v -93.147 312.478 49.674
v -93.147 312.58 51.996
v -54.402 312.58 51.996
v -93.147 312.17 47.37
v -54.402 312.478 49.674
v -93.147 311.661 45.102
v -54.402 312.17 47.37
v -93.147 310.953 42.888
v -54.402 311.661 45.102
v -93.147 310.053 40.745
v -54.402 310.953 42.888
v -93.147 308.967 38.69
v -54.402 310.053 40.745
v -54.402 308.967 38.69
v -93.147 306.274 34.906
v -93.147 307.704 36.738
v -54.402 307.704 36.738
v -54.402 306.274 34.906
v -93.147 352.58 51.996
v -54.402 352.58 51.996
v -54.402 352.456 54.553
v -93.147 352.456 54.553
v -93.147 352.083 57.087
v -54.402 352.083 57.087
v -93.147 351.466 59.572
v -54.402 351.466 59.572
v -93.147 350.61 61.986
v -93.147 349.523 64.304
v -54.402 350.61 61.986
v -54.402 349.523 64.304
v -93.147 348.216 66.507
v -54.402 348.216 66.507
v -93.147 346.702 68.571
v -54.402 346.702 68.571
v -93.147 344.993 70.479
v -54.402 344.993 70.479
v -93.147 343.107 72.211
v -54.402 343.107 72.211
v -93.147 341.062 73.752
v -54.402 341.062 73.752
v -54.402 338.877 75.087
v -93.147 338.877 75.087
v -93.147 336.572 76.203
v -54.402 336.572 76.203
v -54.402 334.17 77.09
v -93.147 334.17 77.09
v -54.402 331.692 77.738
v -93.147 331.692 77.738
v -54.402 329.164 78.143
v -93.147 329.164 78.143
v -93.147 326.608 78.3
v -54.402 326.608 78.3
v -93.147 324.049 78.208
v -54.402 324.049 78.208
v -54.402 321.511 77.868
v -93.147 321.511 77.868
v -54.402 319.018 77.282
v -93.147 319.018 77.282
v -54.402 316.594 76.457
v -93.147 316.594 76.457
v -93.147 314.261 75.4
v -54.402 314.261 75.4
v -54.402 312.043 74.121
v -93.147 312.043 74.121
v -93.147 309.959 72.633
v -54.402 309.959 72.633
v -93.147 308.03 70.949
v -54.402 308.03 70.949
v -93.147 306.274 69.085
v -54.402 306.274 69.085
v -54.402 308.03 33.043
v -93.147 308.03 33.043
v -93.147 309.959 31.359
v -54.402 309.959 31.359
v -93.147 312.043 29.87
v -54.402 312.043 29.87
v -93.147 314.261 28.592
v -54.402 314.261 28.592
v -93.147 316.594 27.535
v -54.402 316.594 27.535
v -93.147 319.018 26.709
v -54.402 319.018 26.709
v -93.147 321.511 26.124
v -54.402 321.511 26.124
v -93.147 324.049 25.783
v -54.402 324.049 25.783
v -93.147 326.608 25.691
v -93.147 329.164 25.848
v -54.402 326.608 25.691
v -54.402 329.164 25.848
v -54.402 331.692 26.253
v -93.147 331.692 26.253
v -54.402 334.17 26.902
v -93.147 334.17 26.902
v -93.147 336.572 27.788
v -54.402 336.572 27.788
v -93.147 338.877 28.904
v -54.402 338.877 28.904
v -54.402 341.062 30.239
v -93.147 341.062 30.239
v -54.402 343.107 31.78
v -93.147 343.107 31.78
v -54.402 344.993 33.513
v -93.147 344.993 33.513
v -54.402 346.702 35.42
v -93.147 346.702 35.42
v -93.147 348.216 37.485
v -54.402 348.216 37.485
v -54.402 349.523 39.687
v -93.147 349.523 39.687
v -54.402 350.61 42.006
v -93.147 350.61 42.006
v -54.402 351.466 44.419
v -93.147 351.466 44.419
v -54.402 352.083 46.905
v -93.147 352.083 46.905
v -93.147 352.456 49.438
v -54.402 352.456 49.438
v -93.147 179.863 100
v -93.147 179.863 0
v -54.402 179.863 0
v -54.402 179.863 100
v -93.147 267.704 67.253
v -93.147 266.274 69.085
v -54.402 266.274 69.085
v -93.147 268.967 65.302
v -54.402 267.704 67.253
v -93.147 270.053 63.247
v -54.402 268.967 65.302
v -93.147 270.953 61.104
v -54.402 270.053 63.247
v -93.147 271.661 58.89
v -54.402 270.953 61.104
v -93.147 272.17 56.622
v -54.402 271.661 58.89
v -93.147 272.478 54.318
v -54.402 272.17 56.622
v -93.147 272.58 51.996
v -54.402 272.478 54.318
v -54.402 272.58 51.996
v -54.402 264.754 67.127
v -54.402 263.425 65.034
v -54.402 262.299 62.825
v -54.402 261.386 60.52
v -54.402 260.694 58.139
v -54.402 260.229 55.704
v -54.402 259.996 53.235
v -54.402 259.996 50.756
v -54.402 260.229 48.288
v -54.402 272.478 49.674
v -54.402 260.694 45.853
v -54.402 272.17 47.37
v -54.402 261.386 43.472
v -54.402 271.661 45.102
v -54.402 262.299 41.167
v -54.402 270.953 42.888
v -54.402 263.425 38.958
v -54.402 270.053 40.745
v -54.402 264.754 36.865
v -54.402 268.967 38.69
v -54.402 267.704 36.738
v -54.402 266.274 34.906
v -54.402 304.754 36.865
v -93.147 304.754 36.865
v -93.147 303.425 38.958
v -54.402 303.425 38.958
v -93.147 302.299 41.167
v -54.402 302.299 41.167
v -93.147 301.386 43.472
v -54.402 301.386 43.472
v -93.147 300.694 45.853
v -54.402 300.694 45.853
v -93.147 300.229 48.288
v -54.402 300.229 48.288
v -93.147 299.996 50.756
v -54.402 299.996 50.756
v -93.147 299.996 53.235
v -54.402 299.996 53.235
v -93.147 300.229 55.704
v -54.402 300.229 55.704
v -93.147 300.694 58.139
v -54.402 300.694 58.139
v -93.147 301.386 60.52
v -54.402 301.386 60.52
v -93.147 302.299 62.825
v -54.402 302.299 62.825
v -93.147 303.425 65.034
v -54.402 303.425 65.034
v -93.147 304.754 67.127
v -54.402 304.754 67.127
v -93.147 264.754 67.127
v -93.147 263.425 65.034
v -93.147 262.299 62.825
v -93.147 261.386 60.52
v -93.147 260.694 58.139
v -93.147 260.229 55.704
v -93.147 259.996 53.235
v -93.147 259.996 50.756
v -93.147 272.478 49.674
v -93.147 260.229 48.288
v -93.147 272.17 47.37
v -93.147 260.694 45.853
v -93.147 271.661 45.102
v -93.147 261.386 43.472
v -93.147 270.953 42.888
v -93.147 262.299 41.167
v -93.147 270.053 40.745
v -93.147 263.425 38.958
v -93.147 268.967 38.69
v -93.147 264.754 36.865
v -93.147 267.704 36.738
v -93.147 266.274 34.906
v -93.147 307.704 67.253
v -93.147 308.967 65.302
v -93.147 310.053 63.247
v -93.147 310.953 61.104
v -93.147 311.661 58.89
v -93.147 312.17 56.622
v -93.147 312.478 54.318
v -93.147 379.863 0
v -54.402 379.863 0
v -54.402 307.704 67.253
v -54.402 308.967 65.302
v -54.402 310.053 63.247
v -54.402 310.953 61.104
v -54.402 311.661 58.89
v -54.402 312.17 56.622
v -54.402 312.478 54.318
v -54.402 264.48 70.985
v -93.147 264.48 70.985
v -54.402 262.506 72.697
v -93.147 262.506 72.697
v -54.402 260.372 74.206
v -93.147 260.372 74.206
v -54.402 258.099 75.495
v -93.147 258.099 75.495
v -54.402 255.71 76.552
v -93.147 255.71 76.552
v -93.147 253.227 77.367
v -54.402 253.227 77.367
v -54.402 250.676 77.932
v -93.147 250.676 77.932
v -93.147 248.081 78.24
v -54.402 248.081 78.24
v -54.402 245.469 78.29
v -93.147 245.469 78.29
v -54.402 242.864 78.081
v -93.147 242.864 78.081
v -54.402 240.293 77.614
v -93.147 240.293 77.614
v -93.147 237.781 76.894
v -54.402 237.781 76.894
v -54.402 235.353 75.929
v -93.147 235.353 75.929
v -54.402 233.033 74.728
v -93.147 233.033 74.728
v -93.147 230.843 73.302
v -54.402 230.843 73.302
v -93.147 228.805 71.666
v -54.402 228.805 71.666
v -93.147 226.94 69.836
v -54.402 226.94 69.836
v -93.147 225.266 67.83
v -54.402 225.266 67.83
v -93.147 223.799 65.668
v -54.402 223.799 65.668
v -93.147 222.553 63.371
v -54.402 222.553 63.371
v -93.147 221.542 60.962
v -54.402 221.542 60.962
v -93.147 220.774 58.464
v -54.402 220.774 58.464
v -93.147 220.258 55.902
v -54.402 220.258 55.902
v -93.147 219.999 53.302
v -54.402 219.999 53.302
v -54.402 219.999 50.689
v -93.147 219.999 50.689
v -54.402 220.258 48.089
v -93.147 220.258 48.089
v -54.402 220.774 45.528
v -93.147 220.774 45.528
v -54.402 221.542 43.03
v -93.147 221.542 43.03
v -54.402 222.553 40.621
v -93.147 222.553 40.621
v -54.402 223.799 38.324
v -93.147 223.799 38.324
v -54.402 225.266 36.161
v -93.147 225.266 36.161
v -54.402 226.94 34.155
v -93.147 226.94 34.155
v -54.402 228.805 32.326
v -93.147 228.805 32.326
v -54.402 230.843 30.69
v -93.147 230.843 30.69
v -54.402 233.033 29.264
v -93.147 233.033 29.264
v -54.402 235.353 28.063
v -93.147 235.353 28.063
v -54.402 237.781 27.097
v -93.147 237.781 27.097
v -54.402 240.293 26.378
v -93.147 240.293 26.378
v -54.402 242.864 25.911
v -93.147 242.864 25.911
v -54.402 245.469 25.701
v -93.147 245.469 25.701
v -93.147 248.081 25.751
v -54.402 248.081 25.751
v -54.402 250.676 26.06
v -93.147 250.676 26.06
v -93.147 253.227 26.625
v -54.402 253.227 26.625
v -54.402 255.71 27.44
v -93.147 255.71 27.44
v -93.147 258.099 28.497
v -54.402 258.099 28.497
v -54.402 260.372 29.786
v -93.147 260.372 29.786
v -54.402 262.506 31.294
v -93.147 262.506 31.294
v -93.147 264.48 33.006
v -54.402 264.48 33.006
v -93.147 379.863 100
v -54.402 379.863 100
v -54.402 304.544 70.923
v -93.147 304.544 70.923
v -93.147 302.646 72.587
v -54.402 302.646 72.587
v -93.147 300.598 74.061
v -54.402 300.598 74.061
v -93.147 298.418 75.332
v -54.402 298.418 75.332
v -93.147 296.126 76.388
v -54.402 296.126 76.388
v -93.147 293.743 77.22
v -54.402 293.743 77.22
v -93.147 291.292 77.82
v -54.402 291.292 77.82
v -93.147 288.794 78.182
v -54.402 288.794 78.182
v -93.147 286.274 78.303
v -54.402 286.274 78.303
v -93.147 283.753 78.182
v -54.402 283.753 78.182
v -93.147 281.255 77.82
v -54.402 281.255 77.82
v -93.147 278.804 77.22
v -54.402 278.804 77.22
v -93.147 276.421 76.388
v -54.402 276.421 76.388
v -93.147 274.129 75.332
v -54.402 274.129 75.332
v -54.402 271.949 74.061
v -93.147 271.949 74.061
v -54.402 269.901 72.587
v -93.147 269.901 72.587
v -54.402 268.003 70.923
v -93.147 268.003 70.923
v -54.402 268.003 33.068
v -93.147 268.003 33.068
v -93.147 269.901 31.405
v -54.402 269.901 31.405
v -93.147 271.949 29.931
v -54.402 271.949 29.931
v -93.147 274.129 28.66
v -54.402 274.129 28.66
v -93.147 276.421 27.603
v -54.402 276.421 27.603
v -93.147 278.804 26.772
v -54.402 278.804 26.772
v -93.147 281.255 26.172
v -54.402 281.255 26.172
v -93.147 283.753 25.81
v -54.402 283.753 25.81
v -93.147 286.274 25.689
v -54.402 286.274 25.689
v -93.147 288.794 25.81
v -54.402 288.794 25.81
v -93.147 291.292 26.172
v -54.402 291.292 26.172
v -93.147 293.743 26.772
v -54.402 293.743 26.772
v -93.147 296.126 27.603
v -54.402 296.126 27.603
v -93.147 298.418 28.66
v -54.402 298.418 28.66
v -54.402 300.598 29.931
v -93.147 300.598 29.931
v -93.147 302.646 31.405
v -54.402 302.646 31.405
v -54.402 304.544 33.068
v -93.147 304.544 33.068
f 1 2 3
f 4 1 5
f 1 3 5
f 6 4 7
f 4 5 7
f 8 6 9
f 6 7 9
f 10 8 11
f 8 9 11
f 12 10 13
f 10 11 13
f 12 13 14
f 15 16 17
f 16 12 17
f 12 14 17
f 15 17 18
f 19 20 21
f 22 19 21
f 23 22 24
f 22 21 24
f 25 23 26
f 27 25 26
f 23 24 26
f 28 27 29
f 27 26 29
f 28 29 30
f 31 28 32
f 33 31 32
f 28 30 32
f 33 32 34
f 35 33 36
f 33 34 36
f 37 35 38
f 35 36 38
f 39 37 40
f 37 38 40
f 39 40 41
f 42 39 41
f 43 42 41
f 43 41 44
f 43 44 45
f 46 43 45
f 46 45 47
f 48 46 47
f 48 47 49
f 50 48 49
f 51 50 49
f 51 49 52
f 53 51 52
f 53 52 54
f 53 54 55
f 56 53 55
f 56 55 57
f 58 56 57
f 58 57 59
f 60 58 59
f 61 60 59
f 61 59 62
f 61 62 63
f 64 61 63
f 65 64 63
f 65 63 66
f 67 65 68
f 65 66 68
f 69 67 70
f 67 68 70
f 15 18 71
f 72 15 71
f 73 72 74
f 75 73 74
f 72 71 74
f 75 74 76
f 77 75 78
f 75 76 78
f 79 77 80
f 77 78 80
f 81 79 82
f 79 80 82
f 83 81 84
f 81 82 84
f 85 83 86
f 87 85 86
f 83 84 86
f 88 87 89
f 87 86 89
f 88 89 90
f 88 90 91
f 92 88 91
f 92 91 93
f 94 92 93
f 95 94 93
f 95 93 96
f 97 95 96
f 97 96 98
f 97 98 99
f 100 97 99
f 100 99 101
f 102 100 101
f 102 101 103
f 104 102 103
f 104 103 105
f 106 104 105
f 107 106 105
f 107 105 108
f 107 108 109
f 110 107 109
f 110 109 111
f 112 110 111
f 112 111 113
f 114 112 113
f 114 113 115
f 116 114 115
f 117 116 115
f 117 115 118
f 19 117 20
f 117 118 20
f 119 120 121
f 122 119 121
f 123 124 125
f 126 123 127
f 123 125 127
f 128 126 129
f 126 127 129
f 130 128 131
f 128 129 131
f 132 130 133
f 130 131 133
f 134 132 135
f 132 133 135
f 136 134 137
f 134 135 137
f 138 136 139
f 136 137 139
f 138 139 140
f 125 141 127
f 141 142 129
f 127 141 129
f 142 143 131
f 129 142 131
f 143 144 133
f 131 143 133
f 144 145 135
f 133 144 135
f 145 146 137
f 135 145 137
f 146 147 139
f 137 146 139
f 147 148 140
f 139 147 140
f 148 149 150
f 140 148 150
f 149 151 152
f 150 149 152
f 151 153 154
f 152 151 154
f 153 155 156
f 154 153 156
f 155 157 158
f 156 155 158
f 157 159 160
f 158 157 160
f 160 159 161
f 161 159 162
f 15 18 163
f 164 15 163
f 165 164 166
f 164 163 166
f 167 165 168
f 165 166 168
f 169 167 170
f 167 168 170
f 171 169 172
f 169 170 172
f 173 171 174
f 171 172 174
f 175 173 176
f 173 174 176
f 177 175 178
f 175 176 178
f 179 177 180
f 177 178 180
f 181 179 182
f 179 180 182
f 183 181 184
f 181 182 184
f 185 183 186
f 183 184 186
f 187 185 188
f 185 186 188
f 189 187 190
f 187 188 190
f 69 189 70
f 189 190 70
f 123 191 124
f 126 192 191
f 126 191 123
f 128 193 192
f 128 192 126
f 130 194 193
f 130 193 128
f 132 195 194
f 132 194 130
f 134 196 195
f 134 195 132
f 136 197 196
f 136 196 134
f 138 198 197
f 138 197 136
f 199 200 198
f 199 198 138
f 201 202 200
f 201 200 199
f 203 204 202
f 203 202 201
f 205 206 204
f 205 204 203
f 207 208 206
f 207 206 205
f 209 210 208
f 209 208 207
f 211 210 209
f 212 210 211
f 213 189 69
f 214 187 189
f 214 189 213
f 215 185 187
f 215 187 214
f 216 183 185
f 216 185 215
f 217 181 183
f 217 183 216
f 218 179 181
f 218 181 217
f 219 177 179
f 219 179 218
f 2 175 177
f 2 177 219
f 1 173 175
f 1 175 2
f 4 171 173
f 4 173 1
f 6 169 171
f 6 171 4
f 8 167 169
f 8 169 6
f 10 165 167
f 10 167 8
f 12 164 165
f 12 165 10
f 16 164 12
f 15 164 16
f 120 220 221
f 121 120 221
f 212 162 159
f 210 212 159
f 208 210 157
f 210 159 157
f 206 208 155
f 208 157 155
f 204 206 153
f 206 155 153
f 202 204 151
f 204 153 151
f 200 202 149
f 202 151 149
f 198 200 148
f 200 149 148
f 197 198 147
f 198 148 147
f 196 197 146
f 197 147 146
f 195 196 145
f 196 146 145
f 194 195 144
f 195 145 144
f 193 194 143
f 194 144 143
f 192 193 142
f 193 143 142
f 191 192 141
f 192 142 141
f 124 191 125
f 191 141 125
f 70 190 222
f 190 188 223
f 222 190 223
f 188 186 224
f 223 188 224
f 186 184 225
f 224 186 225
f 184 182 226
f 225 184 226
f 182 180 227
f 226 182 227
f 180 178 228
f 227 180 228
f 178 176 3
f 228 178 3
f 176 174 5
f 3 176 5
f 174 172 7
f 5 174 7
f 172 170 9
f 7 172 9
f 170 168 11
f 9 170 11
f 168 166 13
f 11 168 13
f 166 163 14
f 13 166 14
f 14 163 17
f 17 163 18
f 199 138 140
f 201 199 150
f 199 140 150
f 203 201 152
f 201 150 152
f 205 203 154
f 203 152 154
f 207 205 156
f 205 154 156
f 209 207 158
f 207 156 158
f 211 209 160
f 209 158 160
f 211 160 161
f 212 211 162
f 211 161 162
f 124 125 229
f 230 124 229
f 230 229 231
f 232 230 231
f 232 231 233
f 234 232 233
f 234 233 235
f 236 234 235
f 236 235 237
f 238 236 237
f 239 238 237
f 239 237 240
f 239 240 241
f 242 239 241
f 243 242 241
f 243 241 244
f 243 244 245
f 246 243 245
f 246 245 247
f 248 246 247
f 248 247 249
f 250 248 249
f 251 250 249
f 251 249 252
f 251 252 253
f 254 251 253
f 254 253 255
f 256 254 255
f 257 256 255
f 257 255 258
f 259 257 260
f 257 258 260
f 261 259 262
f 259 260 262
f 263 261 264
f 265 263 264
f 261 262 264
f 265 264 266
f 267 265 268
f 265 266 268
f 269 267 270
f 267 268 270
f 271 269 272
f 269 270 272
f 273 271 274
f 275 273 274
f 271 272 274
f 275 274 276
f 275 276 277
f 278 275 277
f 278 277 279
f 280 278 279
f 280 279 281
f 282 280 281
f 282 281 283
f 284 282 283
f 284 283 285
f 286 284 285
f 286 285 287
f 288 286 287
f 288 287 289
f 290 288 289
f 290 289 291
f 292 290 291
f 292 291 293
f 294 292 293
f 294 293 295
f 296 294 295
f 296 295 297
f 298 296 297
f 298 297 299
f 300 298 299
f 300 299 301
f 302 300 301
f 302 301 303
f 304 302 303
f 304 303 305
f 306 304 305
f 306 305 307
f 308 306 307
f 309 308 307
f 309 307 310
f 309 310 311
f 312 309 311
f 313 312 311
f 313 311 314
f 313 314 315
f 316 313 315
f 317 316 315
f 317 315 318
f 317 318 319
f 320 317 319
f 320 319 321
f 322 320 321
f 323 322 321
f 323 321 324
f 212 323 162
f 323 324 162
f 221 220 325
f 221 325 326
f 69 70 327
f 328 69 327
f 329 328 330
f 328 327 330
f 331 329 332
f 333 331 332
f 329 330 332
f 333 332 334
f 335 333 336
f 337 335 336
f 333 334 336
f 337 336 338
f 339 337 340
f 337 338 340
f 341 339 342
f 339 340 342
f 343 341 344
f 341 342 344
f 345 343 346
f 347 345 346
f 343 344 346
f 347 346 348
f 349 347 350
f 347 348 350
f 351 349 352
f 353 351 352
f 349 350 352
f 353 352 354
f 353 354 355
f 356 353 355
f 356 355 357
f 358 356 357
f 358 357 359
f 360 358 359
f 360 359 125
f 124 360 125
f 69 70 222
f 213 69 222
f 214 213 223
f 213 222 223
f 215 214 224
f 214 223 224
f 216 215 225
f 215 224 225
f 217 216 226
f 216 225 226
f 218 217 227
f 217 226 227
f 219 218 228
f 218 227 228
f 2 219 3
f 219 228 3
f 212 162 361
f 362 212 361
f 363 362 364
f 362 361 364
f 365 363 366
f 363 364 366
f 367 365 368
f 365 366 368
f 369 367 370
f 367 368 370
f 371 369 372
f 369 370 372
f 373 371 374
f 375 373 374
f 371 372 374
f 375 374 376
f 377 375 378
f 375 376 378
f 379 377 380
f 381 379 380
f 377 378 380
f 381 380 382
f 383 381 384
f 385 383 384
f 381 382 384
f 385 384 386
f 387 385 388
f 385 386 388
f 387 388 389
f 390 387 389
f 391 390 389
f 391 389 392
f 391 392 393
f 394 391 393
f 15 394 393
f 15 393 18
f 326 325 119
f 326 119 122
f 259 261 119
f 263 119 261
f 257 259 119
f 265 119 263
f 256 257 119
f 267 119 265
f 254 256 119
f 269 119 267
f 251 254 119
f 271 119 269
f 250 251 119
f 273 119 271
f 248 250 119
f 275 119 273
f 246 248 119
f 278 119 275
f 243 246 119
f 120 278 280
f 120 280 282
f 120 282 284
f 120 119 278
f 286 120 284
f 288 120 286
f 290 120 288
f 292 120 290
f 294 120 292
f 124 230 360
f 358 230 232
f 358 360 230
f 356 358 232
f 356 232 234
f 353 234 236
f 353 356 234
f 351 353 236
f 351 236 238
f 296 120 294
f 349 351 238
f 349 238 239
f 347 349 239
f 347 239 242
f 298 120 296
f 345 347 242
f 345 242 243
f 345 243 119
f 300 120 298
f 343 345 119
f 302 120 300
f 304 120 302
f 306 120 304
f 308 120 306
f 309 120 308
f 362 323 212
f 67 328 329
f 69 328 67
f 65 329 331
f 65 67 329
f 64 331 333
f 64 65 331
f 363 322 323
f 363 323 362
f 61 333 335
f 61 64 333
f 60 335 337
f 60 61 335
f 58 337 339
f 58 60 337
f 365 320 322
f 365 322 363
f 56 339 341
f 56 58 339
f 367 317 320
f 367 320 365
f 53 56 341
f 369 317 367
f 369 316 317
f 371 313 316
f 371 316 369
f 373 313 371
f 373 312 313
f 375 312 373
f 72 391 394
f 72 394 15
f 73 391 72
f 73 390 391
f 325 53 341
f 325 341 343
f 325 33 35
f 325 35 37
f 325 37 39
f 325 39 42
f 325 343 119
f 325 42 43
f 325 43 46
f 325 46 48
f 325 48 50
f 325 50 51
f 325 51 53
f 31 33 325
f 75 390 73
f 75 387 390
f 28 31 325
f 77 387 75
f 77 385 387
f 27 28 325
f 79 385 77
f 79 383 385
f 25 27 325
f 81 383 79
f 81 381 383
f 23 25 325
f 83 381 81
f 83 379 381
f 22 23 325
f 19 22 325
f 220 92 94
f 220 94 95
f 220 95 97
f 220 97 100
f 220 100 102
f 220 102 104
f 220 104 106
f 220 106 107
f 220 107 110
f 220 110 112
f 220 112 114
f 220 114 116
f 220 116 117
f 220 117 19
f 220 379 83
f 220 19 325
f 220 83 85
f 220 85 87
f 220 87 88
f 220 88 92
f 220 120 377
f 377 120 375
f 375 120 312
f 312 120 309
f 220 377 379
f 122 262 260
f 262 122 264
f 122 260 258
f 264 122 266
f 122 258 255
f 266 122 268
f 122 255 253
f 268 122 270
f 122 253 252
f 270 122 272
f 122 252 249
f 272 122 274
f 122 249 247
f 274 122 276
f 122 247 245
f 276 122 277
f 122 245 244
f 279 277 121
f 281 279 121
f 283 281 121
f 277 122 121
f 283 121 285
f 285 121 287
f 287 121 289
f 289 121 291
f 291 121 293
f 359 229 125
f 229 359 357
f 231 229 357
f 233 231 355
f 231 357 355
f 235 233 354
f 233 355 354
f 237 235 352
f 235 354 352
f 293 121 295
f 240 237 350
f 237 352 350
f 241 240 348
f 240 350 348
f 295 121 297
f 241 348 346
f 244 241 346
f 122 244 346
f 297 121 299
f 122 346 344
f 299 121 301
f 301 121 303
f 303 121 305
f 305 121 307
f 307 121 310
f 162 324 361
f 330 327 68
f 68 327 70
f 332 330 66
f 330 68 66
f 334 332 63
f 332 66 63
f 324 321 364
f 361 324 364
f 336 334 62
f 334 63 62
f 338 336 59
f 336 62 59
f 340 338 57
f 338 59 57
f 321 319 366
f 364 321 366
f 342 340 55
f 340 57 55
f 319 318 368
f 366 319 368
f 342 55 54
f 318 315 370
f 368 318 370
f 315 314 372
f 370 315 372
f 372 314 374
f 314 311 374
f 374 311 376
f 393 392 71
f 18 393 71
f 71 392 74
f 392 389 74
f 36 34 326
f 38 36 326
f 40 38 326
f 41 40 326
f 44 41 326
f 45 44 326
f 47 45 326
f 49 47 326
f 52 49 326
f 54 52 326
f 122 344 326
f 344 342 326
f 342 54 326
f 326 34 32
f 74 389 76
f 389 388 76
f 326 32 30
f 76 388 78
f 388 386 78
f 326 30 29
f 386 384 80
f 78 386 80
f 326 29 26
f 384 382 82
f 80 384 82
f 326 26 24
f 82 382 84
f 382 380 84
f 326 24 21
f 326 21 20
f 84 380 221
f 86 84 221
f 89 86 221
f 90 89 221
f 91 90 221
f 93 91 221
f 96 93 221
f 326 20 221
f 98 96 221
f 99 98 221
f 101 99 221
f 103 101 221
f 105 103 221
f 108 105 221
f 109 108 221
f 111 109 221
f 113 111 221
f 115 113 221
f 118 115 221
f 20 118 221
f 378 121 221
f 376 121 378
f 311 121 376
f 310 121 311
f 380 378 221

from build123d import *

# Parameters (mm, degrees)
F0_W     = 38.7456268072
F0_H     = 200
F1_DEPTH = 100
F3_DEPTH = 200


with BuildPart() as f1:
    # F0 (on Top) → F1 (new body)
    with BuildSketch(Plane.XY):
        with Locations((-73.7745165825, 279.8631054312)):
            Rectangle(F0_W, F0_H)
    extrude(amount=F1_DEPTH)

    # F2 (on face) → F3 (cut)
    with BuildSketch(Plane.YZ.offset(-54.4017031789)):
        with BuildLine():
            ThreePointArc((266.273547411, 34.9062763701), (259.9666993684, 51.9957542419), (266.273547411, 69.0852321138))
            ThreePointArc((266.273547411, 69.0852321138), (219.9666993684, 51.9957542419), (266.273547411, 34.9062763701))
        make_face()
        with BuildLine():
            ThreePointArc((266.273547411, 69.0852321138), (270.9533692781, 61.1038081801), (272.5803954535, 51.9957542419))
            ThreePointArc((272.5803954535, 51.9957542419), (270.9533692781, 42.8877003037), (266.273547411, 34.9062763701))
            ThreePointArc((266.273547411, 34.9062763701), (286.273547411, 25.6889061994), (306.273547411, 34.9062763701))
            ThreePointArc((306.273547411, 34.9062763701), (299.9666993684, 51.9957542419), (306.273547411, 69.0852321138))
            ThreePointArc((306.273547411, 69.0852321138), (286.273547411, 78.3026022845), (266.273547411, 69.0852321138))
        make_face()
        with BuildLine():
            ThreePointArc((352.5803954535, 51.9957542419), (335.3816013492, 76.675576109), (306.273547411, 69.0852321138))
            ThreePointArc((306.273547411, 69.0852321138), (310.9533692781, 61.1038081801), (312.5803954535, 51.9957542419))
            ThreePointArc((312.5803954535, 51.9957542419), (310.9533692781, 42.8877003037), (306.273547411, 34.9062763701))
            ThreePointArc((306.273547411, 34.9062763701), (335.3816013492, 27.3159323748), (352.5803954535, 51.9957542419))
        make_face()
    extrude(amount=-F3_DEPTH, mode=Mode.SUBTRACT)


solid = f1.part
